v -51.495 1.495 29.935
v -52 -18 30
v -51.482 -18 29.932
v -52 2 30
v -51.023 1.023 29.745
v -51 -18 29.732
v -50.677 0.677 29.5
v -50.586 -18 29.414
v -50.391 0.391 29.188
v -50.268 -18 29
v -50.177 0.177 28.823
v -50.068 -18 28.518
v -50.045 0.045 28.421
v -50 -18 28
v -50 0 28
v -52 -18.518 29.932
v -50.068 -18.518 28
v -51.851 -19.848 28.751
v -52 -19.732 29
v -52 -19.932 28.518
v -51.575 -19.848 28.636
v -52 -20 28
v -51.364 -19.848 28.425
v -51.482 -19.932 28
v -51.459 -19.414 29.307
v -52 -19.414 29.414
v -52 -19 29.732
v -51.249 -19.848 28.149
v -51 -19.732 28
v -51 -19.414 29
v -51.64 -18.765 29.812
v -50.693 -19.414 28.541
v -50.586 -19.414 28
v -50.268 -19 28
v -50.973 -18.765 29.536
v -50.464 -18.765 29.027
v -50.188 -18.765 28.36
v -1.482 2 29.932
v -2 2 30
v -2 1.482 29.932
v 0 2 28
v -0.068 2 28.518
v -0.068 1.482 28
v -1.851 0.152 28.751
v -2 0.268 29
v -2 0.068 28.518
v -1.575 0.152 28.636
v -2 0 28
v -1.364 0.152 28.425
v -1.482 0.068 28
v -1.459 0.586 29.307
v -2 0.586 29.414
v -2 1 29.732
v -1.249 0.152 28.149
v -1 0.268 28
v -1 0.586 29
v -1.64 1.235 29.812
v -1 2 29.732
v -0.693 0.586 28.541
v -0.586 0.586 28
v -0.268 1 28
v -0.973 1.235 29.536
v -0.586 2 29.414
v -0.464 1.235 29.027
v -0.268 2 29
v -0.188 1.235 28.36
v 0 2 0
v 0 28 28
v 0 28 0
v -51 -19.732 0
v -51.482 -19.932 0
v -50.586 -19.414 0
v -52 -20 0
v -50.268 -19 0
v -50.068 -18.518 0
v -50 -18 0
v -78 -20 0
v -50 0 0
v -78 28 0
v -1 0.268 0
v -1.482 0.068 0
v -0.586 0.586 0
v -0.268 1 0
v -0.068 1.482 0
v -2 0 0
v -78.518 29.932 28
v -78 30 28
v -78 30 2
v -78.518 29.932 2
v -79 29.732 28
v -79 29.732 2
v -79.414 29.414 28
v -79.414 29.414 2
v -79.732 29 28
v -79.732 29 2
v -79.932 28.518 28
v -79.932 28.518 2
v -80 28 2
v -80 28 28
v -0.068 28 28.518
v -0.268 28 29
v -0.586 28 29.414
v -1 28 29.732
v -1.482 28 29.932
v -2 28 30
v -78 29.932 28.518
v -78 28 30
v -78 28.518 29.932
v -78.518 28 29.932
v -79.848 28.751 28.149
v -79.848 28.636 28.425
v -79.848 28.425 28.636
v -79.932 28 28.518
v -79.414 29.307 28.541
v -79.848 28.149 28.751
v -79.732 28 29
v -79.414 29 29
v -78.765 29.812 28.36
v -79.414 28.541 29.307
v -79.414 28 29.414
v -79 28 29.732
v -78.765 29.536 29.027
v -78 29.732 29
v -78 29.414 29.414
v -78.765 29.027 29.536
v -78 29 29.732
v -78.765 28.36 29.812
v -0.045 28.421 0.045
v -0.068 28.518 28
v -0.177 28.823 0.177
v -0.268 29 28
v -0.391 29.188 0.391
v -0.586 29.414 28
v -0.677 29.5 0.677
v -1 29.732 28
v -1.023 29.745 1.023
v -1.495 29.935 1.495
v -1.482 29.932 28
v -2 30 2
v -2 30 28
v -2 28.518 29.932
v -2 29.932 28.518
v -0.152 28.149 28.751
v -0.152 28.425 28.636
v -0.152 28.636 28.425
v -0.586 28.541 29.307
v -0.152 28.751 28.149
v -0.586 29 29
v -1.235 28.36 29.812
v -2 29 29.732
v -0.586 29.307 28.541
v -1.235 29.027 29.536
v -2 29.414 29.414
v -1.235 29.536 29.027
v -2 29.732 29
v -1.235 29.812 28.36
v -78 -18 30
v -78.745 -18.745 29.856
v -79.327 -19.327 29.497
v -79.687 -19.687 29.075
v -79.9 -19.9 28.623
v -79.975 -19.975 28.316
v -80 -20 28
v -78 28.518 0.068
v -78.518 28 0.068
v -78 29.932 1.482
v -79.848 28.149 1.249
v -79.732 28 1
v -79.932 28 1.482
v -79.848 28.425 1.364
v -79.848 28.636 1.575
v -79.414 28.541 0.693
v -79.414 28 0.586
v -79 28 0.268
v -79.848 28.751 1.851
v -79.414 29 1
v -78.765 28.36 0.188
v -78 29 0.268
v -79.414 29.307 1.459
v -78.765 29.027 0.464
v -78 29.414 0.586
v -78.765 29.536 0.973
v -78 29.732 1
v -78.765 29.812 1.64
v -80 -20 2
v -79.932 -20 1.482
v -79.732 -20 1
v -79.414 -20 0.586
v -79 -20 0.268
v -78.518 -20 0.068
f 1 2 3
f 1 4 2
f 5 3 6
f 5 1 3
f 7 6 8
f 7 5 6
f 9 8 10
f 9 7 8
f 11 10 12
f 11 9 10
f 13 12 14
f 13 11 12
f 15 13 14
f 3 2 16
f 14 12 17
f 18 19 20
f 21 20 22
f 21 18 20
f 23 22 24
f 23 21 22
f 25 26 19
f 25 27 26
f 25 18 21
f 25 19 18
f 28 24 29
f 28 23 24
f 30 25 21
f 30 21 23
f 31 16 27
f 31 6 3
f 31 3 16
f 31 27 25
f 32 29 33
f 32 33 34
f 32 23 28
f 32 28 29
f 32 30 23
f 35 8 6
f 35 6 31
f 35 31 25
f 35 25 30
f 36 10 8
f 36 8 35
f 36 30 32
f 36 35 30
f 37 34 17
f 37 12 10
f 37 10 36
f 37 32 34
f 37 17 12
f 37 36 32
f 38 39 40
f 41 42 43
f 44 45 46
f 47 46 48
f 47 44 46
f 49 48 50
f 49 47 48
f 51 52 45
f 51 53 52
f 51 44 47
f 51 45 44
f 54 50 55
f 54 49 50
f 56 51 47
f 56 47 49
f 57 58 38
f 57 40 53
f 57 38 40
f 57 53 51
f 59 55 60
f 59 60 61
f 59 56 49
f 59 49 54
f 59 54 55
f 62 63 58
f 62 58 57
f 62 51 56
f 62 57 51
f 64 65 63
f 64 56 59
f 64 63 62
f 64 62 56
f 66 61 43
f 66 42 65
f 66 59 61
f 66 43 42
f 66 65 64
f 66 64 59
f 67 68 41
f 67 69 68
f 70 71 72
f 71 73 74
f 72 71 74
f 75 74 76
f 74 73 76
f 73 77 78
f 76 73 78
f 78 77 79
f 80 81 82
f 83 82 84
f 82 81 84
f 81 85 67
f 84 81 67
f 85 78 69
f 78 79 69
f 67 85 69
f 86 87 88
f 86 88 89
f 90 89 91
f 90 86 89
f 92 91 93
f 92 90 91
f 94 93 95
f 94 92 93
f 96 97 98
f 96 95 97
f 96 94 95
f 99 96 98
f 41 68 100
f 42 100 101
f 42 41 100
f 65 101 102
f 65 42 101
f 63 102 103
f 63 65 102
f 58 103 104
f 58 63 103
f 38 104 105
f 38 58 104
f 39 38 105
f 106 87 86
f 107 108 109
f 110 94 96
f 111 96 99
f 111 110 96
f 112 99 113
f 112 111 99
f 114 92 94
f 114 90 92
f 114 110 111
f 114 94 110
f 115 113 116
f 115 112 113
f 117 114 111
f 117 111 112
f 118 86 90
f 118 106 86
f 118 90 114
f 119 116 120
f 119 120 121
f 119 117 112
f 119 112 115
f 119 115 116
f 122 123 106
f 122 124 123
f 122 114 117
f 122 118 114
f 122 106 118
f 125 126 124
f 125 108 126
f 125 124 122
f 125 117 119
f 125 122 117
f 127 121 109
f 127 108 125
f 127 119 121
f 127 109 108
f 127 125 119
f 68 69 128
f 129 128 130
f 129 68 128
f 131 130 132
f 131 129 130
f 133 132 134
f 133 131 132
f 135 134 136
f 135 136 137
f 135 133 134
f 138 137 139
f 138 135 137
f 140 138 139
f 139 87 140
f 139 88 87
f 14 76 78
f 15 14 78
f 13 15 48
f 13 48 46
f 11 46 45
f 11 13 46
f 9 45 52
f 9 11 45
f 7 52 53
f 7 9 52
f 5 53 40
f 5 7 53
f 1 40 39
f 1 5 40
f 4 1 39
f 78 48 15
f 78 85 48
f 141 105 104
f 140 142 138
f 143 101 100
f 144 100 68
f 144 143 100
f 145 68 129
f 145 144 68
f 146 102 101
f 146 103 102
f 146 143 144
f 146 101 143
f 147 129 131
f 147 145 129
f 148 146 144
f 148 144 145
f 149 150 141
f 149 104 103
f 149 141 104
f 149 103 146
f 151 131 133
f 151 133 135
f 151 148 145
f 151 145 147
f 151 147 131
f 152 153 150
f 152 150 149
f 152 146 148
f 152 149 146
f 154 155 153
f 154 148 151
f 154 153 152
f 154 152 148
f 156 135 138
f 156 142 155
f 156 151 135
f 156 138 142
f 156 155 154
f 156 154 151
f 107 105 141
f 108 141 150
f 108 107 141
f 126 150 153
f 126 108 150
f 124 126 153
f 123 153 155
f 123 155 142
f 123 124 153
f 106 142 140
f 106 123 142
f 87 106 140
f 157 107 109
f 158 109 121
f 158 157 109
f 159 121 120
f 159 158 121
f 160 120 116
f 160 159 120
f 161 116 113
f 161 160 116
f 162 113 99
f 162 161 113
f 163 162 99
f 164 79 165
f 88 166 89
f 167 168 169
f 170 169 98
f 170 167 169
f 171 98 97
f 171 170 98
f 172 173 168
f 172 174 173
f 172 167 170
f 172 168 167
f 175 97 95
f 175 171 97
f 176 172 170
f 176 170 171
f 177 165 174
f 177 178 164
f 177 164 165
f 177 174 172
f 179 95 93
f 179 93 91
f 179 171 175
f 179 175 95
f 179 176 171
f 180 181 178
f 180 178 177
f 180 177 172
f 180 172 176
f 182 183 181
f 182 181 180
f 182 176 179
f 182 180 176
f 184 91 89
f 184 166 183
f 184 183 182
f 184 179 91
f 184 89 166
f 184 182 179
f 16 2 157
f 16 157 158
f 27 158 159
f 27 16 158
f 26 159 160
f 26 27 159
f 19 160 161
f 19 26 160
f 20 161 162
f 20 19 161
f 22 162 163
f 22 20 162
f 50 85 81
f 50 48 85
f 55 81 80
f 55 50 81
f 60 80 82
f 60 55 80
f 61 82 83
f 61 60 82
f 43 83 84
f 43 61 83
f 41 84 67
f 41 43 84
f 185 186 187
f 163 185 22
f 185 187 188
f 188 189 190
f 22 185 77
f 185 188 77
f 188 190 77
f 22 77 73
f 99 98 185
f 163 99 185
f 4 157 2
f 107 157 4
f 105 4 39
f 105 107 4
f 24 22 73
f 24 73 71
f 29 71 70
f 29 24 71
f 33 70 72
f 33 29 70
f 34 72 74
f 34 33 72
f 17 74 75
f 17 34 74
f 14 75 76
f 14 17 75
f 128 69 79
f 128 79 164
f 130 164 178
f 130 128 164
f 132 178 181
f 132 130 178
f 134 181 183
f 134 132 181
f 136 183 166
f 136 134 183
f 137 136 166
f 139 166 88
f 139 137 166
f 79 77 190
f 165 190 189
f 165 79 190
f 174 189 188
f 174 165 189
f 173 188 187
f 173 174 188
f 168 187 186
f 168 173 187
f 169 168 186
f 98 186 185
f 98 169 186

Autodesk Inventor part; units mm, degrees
ref_plane "YZ Plane" through (0, 0, 0) normal (1, 0, 0) x (0, 1, 0)
ref_plane "XZ Plane" through (0, 0, 0) normal (0, 1, 0) x (-1, 0, 0)
ref_plane "XY Plane" through (0, 0, 0) normal (0, 0, 1) x (1, 0, 0)
sketch "Sketch1" plane through (0, 0, 0) normal (0, 0, 1) x (1, 0, 0)
  line L0 (0, 0) -> (-50, 0)
  line L1 (-50, 0) -> (-50, 30)
  line L2 (-50, 30) -> (0, 30)
  line L3 (0, 30) -> (0, 0)
  line L4 (-50, 30) -> (-80, 30)
  line L5 (-80, 30) -> (-80, -20)
  line L6 (-80, -20) -> (-50, -20)
  line L7 (-50, -20) -> (-50, 30)
  line L8 (-80, 0) -> (-50, 0)
  dimension "d0" = 50
  dimension "d1" = 30
  dimension "d2" = 30
  dimension "d3" = 50
extrude "Extrusion1" add sketch "Sketch1" along normal blind 30
fillet "Fillet1" radius 2 12 edges at (-40, 30, 30) (0, 15, 30) (-25, 0, 30) (-50, -10, 30) (-50, -20, 15) (-65, -20, 30) (0, 30, 15) (0, 0, 15) (-40, 30, 0) (-80, 30, 15) (-80, 5, 30) (-80, 5, 0)
properties part number "elbow"
